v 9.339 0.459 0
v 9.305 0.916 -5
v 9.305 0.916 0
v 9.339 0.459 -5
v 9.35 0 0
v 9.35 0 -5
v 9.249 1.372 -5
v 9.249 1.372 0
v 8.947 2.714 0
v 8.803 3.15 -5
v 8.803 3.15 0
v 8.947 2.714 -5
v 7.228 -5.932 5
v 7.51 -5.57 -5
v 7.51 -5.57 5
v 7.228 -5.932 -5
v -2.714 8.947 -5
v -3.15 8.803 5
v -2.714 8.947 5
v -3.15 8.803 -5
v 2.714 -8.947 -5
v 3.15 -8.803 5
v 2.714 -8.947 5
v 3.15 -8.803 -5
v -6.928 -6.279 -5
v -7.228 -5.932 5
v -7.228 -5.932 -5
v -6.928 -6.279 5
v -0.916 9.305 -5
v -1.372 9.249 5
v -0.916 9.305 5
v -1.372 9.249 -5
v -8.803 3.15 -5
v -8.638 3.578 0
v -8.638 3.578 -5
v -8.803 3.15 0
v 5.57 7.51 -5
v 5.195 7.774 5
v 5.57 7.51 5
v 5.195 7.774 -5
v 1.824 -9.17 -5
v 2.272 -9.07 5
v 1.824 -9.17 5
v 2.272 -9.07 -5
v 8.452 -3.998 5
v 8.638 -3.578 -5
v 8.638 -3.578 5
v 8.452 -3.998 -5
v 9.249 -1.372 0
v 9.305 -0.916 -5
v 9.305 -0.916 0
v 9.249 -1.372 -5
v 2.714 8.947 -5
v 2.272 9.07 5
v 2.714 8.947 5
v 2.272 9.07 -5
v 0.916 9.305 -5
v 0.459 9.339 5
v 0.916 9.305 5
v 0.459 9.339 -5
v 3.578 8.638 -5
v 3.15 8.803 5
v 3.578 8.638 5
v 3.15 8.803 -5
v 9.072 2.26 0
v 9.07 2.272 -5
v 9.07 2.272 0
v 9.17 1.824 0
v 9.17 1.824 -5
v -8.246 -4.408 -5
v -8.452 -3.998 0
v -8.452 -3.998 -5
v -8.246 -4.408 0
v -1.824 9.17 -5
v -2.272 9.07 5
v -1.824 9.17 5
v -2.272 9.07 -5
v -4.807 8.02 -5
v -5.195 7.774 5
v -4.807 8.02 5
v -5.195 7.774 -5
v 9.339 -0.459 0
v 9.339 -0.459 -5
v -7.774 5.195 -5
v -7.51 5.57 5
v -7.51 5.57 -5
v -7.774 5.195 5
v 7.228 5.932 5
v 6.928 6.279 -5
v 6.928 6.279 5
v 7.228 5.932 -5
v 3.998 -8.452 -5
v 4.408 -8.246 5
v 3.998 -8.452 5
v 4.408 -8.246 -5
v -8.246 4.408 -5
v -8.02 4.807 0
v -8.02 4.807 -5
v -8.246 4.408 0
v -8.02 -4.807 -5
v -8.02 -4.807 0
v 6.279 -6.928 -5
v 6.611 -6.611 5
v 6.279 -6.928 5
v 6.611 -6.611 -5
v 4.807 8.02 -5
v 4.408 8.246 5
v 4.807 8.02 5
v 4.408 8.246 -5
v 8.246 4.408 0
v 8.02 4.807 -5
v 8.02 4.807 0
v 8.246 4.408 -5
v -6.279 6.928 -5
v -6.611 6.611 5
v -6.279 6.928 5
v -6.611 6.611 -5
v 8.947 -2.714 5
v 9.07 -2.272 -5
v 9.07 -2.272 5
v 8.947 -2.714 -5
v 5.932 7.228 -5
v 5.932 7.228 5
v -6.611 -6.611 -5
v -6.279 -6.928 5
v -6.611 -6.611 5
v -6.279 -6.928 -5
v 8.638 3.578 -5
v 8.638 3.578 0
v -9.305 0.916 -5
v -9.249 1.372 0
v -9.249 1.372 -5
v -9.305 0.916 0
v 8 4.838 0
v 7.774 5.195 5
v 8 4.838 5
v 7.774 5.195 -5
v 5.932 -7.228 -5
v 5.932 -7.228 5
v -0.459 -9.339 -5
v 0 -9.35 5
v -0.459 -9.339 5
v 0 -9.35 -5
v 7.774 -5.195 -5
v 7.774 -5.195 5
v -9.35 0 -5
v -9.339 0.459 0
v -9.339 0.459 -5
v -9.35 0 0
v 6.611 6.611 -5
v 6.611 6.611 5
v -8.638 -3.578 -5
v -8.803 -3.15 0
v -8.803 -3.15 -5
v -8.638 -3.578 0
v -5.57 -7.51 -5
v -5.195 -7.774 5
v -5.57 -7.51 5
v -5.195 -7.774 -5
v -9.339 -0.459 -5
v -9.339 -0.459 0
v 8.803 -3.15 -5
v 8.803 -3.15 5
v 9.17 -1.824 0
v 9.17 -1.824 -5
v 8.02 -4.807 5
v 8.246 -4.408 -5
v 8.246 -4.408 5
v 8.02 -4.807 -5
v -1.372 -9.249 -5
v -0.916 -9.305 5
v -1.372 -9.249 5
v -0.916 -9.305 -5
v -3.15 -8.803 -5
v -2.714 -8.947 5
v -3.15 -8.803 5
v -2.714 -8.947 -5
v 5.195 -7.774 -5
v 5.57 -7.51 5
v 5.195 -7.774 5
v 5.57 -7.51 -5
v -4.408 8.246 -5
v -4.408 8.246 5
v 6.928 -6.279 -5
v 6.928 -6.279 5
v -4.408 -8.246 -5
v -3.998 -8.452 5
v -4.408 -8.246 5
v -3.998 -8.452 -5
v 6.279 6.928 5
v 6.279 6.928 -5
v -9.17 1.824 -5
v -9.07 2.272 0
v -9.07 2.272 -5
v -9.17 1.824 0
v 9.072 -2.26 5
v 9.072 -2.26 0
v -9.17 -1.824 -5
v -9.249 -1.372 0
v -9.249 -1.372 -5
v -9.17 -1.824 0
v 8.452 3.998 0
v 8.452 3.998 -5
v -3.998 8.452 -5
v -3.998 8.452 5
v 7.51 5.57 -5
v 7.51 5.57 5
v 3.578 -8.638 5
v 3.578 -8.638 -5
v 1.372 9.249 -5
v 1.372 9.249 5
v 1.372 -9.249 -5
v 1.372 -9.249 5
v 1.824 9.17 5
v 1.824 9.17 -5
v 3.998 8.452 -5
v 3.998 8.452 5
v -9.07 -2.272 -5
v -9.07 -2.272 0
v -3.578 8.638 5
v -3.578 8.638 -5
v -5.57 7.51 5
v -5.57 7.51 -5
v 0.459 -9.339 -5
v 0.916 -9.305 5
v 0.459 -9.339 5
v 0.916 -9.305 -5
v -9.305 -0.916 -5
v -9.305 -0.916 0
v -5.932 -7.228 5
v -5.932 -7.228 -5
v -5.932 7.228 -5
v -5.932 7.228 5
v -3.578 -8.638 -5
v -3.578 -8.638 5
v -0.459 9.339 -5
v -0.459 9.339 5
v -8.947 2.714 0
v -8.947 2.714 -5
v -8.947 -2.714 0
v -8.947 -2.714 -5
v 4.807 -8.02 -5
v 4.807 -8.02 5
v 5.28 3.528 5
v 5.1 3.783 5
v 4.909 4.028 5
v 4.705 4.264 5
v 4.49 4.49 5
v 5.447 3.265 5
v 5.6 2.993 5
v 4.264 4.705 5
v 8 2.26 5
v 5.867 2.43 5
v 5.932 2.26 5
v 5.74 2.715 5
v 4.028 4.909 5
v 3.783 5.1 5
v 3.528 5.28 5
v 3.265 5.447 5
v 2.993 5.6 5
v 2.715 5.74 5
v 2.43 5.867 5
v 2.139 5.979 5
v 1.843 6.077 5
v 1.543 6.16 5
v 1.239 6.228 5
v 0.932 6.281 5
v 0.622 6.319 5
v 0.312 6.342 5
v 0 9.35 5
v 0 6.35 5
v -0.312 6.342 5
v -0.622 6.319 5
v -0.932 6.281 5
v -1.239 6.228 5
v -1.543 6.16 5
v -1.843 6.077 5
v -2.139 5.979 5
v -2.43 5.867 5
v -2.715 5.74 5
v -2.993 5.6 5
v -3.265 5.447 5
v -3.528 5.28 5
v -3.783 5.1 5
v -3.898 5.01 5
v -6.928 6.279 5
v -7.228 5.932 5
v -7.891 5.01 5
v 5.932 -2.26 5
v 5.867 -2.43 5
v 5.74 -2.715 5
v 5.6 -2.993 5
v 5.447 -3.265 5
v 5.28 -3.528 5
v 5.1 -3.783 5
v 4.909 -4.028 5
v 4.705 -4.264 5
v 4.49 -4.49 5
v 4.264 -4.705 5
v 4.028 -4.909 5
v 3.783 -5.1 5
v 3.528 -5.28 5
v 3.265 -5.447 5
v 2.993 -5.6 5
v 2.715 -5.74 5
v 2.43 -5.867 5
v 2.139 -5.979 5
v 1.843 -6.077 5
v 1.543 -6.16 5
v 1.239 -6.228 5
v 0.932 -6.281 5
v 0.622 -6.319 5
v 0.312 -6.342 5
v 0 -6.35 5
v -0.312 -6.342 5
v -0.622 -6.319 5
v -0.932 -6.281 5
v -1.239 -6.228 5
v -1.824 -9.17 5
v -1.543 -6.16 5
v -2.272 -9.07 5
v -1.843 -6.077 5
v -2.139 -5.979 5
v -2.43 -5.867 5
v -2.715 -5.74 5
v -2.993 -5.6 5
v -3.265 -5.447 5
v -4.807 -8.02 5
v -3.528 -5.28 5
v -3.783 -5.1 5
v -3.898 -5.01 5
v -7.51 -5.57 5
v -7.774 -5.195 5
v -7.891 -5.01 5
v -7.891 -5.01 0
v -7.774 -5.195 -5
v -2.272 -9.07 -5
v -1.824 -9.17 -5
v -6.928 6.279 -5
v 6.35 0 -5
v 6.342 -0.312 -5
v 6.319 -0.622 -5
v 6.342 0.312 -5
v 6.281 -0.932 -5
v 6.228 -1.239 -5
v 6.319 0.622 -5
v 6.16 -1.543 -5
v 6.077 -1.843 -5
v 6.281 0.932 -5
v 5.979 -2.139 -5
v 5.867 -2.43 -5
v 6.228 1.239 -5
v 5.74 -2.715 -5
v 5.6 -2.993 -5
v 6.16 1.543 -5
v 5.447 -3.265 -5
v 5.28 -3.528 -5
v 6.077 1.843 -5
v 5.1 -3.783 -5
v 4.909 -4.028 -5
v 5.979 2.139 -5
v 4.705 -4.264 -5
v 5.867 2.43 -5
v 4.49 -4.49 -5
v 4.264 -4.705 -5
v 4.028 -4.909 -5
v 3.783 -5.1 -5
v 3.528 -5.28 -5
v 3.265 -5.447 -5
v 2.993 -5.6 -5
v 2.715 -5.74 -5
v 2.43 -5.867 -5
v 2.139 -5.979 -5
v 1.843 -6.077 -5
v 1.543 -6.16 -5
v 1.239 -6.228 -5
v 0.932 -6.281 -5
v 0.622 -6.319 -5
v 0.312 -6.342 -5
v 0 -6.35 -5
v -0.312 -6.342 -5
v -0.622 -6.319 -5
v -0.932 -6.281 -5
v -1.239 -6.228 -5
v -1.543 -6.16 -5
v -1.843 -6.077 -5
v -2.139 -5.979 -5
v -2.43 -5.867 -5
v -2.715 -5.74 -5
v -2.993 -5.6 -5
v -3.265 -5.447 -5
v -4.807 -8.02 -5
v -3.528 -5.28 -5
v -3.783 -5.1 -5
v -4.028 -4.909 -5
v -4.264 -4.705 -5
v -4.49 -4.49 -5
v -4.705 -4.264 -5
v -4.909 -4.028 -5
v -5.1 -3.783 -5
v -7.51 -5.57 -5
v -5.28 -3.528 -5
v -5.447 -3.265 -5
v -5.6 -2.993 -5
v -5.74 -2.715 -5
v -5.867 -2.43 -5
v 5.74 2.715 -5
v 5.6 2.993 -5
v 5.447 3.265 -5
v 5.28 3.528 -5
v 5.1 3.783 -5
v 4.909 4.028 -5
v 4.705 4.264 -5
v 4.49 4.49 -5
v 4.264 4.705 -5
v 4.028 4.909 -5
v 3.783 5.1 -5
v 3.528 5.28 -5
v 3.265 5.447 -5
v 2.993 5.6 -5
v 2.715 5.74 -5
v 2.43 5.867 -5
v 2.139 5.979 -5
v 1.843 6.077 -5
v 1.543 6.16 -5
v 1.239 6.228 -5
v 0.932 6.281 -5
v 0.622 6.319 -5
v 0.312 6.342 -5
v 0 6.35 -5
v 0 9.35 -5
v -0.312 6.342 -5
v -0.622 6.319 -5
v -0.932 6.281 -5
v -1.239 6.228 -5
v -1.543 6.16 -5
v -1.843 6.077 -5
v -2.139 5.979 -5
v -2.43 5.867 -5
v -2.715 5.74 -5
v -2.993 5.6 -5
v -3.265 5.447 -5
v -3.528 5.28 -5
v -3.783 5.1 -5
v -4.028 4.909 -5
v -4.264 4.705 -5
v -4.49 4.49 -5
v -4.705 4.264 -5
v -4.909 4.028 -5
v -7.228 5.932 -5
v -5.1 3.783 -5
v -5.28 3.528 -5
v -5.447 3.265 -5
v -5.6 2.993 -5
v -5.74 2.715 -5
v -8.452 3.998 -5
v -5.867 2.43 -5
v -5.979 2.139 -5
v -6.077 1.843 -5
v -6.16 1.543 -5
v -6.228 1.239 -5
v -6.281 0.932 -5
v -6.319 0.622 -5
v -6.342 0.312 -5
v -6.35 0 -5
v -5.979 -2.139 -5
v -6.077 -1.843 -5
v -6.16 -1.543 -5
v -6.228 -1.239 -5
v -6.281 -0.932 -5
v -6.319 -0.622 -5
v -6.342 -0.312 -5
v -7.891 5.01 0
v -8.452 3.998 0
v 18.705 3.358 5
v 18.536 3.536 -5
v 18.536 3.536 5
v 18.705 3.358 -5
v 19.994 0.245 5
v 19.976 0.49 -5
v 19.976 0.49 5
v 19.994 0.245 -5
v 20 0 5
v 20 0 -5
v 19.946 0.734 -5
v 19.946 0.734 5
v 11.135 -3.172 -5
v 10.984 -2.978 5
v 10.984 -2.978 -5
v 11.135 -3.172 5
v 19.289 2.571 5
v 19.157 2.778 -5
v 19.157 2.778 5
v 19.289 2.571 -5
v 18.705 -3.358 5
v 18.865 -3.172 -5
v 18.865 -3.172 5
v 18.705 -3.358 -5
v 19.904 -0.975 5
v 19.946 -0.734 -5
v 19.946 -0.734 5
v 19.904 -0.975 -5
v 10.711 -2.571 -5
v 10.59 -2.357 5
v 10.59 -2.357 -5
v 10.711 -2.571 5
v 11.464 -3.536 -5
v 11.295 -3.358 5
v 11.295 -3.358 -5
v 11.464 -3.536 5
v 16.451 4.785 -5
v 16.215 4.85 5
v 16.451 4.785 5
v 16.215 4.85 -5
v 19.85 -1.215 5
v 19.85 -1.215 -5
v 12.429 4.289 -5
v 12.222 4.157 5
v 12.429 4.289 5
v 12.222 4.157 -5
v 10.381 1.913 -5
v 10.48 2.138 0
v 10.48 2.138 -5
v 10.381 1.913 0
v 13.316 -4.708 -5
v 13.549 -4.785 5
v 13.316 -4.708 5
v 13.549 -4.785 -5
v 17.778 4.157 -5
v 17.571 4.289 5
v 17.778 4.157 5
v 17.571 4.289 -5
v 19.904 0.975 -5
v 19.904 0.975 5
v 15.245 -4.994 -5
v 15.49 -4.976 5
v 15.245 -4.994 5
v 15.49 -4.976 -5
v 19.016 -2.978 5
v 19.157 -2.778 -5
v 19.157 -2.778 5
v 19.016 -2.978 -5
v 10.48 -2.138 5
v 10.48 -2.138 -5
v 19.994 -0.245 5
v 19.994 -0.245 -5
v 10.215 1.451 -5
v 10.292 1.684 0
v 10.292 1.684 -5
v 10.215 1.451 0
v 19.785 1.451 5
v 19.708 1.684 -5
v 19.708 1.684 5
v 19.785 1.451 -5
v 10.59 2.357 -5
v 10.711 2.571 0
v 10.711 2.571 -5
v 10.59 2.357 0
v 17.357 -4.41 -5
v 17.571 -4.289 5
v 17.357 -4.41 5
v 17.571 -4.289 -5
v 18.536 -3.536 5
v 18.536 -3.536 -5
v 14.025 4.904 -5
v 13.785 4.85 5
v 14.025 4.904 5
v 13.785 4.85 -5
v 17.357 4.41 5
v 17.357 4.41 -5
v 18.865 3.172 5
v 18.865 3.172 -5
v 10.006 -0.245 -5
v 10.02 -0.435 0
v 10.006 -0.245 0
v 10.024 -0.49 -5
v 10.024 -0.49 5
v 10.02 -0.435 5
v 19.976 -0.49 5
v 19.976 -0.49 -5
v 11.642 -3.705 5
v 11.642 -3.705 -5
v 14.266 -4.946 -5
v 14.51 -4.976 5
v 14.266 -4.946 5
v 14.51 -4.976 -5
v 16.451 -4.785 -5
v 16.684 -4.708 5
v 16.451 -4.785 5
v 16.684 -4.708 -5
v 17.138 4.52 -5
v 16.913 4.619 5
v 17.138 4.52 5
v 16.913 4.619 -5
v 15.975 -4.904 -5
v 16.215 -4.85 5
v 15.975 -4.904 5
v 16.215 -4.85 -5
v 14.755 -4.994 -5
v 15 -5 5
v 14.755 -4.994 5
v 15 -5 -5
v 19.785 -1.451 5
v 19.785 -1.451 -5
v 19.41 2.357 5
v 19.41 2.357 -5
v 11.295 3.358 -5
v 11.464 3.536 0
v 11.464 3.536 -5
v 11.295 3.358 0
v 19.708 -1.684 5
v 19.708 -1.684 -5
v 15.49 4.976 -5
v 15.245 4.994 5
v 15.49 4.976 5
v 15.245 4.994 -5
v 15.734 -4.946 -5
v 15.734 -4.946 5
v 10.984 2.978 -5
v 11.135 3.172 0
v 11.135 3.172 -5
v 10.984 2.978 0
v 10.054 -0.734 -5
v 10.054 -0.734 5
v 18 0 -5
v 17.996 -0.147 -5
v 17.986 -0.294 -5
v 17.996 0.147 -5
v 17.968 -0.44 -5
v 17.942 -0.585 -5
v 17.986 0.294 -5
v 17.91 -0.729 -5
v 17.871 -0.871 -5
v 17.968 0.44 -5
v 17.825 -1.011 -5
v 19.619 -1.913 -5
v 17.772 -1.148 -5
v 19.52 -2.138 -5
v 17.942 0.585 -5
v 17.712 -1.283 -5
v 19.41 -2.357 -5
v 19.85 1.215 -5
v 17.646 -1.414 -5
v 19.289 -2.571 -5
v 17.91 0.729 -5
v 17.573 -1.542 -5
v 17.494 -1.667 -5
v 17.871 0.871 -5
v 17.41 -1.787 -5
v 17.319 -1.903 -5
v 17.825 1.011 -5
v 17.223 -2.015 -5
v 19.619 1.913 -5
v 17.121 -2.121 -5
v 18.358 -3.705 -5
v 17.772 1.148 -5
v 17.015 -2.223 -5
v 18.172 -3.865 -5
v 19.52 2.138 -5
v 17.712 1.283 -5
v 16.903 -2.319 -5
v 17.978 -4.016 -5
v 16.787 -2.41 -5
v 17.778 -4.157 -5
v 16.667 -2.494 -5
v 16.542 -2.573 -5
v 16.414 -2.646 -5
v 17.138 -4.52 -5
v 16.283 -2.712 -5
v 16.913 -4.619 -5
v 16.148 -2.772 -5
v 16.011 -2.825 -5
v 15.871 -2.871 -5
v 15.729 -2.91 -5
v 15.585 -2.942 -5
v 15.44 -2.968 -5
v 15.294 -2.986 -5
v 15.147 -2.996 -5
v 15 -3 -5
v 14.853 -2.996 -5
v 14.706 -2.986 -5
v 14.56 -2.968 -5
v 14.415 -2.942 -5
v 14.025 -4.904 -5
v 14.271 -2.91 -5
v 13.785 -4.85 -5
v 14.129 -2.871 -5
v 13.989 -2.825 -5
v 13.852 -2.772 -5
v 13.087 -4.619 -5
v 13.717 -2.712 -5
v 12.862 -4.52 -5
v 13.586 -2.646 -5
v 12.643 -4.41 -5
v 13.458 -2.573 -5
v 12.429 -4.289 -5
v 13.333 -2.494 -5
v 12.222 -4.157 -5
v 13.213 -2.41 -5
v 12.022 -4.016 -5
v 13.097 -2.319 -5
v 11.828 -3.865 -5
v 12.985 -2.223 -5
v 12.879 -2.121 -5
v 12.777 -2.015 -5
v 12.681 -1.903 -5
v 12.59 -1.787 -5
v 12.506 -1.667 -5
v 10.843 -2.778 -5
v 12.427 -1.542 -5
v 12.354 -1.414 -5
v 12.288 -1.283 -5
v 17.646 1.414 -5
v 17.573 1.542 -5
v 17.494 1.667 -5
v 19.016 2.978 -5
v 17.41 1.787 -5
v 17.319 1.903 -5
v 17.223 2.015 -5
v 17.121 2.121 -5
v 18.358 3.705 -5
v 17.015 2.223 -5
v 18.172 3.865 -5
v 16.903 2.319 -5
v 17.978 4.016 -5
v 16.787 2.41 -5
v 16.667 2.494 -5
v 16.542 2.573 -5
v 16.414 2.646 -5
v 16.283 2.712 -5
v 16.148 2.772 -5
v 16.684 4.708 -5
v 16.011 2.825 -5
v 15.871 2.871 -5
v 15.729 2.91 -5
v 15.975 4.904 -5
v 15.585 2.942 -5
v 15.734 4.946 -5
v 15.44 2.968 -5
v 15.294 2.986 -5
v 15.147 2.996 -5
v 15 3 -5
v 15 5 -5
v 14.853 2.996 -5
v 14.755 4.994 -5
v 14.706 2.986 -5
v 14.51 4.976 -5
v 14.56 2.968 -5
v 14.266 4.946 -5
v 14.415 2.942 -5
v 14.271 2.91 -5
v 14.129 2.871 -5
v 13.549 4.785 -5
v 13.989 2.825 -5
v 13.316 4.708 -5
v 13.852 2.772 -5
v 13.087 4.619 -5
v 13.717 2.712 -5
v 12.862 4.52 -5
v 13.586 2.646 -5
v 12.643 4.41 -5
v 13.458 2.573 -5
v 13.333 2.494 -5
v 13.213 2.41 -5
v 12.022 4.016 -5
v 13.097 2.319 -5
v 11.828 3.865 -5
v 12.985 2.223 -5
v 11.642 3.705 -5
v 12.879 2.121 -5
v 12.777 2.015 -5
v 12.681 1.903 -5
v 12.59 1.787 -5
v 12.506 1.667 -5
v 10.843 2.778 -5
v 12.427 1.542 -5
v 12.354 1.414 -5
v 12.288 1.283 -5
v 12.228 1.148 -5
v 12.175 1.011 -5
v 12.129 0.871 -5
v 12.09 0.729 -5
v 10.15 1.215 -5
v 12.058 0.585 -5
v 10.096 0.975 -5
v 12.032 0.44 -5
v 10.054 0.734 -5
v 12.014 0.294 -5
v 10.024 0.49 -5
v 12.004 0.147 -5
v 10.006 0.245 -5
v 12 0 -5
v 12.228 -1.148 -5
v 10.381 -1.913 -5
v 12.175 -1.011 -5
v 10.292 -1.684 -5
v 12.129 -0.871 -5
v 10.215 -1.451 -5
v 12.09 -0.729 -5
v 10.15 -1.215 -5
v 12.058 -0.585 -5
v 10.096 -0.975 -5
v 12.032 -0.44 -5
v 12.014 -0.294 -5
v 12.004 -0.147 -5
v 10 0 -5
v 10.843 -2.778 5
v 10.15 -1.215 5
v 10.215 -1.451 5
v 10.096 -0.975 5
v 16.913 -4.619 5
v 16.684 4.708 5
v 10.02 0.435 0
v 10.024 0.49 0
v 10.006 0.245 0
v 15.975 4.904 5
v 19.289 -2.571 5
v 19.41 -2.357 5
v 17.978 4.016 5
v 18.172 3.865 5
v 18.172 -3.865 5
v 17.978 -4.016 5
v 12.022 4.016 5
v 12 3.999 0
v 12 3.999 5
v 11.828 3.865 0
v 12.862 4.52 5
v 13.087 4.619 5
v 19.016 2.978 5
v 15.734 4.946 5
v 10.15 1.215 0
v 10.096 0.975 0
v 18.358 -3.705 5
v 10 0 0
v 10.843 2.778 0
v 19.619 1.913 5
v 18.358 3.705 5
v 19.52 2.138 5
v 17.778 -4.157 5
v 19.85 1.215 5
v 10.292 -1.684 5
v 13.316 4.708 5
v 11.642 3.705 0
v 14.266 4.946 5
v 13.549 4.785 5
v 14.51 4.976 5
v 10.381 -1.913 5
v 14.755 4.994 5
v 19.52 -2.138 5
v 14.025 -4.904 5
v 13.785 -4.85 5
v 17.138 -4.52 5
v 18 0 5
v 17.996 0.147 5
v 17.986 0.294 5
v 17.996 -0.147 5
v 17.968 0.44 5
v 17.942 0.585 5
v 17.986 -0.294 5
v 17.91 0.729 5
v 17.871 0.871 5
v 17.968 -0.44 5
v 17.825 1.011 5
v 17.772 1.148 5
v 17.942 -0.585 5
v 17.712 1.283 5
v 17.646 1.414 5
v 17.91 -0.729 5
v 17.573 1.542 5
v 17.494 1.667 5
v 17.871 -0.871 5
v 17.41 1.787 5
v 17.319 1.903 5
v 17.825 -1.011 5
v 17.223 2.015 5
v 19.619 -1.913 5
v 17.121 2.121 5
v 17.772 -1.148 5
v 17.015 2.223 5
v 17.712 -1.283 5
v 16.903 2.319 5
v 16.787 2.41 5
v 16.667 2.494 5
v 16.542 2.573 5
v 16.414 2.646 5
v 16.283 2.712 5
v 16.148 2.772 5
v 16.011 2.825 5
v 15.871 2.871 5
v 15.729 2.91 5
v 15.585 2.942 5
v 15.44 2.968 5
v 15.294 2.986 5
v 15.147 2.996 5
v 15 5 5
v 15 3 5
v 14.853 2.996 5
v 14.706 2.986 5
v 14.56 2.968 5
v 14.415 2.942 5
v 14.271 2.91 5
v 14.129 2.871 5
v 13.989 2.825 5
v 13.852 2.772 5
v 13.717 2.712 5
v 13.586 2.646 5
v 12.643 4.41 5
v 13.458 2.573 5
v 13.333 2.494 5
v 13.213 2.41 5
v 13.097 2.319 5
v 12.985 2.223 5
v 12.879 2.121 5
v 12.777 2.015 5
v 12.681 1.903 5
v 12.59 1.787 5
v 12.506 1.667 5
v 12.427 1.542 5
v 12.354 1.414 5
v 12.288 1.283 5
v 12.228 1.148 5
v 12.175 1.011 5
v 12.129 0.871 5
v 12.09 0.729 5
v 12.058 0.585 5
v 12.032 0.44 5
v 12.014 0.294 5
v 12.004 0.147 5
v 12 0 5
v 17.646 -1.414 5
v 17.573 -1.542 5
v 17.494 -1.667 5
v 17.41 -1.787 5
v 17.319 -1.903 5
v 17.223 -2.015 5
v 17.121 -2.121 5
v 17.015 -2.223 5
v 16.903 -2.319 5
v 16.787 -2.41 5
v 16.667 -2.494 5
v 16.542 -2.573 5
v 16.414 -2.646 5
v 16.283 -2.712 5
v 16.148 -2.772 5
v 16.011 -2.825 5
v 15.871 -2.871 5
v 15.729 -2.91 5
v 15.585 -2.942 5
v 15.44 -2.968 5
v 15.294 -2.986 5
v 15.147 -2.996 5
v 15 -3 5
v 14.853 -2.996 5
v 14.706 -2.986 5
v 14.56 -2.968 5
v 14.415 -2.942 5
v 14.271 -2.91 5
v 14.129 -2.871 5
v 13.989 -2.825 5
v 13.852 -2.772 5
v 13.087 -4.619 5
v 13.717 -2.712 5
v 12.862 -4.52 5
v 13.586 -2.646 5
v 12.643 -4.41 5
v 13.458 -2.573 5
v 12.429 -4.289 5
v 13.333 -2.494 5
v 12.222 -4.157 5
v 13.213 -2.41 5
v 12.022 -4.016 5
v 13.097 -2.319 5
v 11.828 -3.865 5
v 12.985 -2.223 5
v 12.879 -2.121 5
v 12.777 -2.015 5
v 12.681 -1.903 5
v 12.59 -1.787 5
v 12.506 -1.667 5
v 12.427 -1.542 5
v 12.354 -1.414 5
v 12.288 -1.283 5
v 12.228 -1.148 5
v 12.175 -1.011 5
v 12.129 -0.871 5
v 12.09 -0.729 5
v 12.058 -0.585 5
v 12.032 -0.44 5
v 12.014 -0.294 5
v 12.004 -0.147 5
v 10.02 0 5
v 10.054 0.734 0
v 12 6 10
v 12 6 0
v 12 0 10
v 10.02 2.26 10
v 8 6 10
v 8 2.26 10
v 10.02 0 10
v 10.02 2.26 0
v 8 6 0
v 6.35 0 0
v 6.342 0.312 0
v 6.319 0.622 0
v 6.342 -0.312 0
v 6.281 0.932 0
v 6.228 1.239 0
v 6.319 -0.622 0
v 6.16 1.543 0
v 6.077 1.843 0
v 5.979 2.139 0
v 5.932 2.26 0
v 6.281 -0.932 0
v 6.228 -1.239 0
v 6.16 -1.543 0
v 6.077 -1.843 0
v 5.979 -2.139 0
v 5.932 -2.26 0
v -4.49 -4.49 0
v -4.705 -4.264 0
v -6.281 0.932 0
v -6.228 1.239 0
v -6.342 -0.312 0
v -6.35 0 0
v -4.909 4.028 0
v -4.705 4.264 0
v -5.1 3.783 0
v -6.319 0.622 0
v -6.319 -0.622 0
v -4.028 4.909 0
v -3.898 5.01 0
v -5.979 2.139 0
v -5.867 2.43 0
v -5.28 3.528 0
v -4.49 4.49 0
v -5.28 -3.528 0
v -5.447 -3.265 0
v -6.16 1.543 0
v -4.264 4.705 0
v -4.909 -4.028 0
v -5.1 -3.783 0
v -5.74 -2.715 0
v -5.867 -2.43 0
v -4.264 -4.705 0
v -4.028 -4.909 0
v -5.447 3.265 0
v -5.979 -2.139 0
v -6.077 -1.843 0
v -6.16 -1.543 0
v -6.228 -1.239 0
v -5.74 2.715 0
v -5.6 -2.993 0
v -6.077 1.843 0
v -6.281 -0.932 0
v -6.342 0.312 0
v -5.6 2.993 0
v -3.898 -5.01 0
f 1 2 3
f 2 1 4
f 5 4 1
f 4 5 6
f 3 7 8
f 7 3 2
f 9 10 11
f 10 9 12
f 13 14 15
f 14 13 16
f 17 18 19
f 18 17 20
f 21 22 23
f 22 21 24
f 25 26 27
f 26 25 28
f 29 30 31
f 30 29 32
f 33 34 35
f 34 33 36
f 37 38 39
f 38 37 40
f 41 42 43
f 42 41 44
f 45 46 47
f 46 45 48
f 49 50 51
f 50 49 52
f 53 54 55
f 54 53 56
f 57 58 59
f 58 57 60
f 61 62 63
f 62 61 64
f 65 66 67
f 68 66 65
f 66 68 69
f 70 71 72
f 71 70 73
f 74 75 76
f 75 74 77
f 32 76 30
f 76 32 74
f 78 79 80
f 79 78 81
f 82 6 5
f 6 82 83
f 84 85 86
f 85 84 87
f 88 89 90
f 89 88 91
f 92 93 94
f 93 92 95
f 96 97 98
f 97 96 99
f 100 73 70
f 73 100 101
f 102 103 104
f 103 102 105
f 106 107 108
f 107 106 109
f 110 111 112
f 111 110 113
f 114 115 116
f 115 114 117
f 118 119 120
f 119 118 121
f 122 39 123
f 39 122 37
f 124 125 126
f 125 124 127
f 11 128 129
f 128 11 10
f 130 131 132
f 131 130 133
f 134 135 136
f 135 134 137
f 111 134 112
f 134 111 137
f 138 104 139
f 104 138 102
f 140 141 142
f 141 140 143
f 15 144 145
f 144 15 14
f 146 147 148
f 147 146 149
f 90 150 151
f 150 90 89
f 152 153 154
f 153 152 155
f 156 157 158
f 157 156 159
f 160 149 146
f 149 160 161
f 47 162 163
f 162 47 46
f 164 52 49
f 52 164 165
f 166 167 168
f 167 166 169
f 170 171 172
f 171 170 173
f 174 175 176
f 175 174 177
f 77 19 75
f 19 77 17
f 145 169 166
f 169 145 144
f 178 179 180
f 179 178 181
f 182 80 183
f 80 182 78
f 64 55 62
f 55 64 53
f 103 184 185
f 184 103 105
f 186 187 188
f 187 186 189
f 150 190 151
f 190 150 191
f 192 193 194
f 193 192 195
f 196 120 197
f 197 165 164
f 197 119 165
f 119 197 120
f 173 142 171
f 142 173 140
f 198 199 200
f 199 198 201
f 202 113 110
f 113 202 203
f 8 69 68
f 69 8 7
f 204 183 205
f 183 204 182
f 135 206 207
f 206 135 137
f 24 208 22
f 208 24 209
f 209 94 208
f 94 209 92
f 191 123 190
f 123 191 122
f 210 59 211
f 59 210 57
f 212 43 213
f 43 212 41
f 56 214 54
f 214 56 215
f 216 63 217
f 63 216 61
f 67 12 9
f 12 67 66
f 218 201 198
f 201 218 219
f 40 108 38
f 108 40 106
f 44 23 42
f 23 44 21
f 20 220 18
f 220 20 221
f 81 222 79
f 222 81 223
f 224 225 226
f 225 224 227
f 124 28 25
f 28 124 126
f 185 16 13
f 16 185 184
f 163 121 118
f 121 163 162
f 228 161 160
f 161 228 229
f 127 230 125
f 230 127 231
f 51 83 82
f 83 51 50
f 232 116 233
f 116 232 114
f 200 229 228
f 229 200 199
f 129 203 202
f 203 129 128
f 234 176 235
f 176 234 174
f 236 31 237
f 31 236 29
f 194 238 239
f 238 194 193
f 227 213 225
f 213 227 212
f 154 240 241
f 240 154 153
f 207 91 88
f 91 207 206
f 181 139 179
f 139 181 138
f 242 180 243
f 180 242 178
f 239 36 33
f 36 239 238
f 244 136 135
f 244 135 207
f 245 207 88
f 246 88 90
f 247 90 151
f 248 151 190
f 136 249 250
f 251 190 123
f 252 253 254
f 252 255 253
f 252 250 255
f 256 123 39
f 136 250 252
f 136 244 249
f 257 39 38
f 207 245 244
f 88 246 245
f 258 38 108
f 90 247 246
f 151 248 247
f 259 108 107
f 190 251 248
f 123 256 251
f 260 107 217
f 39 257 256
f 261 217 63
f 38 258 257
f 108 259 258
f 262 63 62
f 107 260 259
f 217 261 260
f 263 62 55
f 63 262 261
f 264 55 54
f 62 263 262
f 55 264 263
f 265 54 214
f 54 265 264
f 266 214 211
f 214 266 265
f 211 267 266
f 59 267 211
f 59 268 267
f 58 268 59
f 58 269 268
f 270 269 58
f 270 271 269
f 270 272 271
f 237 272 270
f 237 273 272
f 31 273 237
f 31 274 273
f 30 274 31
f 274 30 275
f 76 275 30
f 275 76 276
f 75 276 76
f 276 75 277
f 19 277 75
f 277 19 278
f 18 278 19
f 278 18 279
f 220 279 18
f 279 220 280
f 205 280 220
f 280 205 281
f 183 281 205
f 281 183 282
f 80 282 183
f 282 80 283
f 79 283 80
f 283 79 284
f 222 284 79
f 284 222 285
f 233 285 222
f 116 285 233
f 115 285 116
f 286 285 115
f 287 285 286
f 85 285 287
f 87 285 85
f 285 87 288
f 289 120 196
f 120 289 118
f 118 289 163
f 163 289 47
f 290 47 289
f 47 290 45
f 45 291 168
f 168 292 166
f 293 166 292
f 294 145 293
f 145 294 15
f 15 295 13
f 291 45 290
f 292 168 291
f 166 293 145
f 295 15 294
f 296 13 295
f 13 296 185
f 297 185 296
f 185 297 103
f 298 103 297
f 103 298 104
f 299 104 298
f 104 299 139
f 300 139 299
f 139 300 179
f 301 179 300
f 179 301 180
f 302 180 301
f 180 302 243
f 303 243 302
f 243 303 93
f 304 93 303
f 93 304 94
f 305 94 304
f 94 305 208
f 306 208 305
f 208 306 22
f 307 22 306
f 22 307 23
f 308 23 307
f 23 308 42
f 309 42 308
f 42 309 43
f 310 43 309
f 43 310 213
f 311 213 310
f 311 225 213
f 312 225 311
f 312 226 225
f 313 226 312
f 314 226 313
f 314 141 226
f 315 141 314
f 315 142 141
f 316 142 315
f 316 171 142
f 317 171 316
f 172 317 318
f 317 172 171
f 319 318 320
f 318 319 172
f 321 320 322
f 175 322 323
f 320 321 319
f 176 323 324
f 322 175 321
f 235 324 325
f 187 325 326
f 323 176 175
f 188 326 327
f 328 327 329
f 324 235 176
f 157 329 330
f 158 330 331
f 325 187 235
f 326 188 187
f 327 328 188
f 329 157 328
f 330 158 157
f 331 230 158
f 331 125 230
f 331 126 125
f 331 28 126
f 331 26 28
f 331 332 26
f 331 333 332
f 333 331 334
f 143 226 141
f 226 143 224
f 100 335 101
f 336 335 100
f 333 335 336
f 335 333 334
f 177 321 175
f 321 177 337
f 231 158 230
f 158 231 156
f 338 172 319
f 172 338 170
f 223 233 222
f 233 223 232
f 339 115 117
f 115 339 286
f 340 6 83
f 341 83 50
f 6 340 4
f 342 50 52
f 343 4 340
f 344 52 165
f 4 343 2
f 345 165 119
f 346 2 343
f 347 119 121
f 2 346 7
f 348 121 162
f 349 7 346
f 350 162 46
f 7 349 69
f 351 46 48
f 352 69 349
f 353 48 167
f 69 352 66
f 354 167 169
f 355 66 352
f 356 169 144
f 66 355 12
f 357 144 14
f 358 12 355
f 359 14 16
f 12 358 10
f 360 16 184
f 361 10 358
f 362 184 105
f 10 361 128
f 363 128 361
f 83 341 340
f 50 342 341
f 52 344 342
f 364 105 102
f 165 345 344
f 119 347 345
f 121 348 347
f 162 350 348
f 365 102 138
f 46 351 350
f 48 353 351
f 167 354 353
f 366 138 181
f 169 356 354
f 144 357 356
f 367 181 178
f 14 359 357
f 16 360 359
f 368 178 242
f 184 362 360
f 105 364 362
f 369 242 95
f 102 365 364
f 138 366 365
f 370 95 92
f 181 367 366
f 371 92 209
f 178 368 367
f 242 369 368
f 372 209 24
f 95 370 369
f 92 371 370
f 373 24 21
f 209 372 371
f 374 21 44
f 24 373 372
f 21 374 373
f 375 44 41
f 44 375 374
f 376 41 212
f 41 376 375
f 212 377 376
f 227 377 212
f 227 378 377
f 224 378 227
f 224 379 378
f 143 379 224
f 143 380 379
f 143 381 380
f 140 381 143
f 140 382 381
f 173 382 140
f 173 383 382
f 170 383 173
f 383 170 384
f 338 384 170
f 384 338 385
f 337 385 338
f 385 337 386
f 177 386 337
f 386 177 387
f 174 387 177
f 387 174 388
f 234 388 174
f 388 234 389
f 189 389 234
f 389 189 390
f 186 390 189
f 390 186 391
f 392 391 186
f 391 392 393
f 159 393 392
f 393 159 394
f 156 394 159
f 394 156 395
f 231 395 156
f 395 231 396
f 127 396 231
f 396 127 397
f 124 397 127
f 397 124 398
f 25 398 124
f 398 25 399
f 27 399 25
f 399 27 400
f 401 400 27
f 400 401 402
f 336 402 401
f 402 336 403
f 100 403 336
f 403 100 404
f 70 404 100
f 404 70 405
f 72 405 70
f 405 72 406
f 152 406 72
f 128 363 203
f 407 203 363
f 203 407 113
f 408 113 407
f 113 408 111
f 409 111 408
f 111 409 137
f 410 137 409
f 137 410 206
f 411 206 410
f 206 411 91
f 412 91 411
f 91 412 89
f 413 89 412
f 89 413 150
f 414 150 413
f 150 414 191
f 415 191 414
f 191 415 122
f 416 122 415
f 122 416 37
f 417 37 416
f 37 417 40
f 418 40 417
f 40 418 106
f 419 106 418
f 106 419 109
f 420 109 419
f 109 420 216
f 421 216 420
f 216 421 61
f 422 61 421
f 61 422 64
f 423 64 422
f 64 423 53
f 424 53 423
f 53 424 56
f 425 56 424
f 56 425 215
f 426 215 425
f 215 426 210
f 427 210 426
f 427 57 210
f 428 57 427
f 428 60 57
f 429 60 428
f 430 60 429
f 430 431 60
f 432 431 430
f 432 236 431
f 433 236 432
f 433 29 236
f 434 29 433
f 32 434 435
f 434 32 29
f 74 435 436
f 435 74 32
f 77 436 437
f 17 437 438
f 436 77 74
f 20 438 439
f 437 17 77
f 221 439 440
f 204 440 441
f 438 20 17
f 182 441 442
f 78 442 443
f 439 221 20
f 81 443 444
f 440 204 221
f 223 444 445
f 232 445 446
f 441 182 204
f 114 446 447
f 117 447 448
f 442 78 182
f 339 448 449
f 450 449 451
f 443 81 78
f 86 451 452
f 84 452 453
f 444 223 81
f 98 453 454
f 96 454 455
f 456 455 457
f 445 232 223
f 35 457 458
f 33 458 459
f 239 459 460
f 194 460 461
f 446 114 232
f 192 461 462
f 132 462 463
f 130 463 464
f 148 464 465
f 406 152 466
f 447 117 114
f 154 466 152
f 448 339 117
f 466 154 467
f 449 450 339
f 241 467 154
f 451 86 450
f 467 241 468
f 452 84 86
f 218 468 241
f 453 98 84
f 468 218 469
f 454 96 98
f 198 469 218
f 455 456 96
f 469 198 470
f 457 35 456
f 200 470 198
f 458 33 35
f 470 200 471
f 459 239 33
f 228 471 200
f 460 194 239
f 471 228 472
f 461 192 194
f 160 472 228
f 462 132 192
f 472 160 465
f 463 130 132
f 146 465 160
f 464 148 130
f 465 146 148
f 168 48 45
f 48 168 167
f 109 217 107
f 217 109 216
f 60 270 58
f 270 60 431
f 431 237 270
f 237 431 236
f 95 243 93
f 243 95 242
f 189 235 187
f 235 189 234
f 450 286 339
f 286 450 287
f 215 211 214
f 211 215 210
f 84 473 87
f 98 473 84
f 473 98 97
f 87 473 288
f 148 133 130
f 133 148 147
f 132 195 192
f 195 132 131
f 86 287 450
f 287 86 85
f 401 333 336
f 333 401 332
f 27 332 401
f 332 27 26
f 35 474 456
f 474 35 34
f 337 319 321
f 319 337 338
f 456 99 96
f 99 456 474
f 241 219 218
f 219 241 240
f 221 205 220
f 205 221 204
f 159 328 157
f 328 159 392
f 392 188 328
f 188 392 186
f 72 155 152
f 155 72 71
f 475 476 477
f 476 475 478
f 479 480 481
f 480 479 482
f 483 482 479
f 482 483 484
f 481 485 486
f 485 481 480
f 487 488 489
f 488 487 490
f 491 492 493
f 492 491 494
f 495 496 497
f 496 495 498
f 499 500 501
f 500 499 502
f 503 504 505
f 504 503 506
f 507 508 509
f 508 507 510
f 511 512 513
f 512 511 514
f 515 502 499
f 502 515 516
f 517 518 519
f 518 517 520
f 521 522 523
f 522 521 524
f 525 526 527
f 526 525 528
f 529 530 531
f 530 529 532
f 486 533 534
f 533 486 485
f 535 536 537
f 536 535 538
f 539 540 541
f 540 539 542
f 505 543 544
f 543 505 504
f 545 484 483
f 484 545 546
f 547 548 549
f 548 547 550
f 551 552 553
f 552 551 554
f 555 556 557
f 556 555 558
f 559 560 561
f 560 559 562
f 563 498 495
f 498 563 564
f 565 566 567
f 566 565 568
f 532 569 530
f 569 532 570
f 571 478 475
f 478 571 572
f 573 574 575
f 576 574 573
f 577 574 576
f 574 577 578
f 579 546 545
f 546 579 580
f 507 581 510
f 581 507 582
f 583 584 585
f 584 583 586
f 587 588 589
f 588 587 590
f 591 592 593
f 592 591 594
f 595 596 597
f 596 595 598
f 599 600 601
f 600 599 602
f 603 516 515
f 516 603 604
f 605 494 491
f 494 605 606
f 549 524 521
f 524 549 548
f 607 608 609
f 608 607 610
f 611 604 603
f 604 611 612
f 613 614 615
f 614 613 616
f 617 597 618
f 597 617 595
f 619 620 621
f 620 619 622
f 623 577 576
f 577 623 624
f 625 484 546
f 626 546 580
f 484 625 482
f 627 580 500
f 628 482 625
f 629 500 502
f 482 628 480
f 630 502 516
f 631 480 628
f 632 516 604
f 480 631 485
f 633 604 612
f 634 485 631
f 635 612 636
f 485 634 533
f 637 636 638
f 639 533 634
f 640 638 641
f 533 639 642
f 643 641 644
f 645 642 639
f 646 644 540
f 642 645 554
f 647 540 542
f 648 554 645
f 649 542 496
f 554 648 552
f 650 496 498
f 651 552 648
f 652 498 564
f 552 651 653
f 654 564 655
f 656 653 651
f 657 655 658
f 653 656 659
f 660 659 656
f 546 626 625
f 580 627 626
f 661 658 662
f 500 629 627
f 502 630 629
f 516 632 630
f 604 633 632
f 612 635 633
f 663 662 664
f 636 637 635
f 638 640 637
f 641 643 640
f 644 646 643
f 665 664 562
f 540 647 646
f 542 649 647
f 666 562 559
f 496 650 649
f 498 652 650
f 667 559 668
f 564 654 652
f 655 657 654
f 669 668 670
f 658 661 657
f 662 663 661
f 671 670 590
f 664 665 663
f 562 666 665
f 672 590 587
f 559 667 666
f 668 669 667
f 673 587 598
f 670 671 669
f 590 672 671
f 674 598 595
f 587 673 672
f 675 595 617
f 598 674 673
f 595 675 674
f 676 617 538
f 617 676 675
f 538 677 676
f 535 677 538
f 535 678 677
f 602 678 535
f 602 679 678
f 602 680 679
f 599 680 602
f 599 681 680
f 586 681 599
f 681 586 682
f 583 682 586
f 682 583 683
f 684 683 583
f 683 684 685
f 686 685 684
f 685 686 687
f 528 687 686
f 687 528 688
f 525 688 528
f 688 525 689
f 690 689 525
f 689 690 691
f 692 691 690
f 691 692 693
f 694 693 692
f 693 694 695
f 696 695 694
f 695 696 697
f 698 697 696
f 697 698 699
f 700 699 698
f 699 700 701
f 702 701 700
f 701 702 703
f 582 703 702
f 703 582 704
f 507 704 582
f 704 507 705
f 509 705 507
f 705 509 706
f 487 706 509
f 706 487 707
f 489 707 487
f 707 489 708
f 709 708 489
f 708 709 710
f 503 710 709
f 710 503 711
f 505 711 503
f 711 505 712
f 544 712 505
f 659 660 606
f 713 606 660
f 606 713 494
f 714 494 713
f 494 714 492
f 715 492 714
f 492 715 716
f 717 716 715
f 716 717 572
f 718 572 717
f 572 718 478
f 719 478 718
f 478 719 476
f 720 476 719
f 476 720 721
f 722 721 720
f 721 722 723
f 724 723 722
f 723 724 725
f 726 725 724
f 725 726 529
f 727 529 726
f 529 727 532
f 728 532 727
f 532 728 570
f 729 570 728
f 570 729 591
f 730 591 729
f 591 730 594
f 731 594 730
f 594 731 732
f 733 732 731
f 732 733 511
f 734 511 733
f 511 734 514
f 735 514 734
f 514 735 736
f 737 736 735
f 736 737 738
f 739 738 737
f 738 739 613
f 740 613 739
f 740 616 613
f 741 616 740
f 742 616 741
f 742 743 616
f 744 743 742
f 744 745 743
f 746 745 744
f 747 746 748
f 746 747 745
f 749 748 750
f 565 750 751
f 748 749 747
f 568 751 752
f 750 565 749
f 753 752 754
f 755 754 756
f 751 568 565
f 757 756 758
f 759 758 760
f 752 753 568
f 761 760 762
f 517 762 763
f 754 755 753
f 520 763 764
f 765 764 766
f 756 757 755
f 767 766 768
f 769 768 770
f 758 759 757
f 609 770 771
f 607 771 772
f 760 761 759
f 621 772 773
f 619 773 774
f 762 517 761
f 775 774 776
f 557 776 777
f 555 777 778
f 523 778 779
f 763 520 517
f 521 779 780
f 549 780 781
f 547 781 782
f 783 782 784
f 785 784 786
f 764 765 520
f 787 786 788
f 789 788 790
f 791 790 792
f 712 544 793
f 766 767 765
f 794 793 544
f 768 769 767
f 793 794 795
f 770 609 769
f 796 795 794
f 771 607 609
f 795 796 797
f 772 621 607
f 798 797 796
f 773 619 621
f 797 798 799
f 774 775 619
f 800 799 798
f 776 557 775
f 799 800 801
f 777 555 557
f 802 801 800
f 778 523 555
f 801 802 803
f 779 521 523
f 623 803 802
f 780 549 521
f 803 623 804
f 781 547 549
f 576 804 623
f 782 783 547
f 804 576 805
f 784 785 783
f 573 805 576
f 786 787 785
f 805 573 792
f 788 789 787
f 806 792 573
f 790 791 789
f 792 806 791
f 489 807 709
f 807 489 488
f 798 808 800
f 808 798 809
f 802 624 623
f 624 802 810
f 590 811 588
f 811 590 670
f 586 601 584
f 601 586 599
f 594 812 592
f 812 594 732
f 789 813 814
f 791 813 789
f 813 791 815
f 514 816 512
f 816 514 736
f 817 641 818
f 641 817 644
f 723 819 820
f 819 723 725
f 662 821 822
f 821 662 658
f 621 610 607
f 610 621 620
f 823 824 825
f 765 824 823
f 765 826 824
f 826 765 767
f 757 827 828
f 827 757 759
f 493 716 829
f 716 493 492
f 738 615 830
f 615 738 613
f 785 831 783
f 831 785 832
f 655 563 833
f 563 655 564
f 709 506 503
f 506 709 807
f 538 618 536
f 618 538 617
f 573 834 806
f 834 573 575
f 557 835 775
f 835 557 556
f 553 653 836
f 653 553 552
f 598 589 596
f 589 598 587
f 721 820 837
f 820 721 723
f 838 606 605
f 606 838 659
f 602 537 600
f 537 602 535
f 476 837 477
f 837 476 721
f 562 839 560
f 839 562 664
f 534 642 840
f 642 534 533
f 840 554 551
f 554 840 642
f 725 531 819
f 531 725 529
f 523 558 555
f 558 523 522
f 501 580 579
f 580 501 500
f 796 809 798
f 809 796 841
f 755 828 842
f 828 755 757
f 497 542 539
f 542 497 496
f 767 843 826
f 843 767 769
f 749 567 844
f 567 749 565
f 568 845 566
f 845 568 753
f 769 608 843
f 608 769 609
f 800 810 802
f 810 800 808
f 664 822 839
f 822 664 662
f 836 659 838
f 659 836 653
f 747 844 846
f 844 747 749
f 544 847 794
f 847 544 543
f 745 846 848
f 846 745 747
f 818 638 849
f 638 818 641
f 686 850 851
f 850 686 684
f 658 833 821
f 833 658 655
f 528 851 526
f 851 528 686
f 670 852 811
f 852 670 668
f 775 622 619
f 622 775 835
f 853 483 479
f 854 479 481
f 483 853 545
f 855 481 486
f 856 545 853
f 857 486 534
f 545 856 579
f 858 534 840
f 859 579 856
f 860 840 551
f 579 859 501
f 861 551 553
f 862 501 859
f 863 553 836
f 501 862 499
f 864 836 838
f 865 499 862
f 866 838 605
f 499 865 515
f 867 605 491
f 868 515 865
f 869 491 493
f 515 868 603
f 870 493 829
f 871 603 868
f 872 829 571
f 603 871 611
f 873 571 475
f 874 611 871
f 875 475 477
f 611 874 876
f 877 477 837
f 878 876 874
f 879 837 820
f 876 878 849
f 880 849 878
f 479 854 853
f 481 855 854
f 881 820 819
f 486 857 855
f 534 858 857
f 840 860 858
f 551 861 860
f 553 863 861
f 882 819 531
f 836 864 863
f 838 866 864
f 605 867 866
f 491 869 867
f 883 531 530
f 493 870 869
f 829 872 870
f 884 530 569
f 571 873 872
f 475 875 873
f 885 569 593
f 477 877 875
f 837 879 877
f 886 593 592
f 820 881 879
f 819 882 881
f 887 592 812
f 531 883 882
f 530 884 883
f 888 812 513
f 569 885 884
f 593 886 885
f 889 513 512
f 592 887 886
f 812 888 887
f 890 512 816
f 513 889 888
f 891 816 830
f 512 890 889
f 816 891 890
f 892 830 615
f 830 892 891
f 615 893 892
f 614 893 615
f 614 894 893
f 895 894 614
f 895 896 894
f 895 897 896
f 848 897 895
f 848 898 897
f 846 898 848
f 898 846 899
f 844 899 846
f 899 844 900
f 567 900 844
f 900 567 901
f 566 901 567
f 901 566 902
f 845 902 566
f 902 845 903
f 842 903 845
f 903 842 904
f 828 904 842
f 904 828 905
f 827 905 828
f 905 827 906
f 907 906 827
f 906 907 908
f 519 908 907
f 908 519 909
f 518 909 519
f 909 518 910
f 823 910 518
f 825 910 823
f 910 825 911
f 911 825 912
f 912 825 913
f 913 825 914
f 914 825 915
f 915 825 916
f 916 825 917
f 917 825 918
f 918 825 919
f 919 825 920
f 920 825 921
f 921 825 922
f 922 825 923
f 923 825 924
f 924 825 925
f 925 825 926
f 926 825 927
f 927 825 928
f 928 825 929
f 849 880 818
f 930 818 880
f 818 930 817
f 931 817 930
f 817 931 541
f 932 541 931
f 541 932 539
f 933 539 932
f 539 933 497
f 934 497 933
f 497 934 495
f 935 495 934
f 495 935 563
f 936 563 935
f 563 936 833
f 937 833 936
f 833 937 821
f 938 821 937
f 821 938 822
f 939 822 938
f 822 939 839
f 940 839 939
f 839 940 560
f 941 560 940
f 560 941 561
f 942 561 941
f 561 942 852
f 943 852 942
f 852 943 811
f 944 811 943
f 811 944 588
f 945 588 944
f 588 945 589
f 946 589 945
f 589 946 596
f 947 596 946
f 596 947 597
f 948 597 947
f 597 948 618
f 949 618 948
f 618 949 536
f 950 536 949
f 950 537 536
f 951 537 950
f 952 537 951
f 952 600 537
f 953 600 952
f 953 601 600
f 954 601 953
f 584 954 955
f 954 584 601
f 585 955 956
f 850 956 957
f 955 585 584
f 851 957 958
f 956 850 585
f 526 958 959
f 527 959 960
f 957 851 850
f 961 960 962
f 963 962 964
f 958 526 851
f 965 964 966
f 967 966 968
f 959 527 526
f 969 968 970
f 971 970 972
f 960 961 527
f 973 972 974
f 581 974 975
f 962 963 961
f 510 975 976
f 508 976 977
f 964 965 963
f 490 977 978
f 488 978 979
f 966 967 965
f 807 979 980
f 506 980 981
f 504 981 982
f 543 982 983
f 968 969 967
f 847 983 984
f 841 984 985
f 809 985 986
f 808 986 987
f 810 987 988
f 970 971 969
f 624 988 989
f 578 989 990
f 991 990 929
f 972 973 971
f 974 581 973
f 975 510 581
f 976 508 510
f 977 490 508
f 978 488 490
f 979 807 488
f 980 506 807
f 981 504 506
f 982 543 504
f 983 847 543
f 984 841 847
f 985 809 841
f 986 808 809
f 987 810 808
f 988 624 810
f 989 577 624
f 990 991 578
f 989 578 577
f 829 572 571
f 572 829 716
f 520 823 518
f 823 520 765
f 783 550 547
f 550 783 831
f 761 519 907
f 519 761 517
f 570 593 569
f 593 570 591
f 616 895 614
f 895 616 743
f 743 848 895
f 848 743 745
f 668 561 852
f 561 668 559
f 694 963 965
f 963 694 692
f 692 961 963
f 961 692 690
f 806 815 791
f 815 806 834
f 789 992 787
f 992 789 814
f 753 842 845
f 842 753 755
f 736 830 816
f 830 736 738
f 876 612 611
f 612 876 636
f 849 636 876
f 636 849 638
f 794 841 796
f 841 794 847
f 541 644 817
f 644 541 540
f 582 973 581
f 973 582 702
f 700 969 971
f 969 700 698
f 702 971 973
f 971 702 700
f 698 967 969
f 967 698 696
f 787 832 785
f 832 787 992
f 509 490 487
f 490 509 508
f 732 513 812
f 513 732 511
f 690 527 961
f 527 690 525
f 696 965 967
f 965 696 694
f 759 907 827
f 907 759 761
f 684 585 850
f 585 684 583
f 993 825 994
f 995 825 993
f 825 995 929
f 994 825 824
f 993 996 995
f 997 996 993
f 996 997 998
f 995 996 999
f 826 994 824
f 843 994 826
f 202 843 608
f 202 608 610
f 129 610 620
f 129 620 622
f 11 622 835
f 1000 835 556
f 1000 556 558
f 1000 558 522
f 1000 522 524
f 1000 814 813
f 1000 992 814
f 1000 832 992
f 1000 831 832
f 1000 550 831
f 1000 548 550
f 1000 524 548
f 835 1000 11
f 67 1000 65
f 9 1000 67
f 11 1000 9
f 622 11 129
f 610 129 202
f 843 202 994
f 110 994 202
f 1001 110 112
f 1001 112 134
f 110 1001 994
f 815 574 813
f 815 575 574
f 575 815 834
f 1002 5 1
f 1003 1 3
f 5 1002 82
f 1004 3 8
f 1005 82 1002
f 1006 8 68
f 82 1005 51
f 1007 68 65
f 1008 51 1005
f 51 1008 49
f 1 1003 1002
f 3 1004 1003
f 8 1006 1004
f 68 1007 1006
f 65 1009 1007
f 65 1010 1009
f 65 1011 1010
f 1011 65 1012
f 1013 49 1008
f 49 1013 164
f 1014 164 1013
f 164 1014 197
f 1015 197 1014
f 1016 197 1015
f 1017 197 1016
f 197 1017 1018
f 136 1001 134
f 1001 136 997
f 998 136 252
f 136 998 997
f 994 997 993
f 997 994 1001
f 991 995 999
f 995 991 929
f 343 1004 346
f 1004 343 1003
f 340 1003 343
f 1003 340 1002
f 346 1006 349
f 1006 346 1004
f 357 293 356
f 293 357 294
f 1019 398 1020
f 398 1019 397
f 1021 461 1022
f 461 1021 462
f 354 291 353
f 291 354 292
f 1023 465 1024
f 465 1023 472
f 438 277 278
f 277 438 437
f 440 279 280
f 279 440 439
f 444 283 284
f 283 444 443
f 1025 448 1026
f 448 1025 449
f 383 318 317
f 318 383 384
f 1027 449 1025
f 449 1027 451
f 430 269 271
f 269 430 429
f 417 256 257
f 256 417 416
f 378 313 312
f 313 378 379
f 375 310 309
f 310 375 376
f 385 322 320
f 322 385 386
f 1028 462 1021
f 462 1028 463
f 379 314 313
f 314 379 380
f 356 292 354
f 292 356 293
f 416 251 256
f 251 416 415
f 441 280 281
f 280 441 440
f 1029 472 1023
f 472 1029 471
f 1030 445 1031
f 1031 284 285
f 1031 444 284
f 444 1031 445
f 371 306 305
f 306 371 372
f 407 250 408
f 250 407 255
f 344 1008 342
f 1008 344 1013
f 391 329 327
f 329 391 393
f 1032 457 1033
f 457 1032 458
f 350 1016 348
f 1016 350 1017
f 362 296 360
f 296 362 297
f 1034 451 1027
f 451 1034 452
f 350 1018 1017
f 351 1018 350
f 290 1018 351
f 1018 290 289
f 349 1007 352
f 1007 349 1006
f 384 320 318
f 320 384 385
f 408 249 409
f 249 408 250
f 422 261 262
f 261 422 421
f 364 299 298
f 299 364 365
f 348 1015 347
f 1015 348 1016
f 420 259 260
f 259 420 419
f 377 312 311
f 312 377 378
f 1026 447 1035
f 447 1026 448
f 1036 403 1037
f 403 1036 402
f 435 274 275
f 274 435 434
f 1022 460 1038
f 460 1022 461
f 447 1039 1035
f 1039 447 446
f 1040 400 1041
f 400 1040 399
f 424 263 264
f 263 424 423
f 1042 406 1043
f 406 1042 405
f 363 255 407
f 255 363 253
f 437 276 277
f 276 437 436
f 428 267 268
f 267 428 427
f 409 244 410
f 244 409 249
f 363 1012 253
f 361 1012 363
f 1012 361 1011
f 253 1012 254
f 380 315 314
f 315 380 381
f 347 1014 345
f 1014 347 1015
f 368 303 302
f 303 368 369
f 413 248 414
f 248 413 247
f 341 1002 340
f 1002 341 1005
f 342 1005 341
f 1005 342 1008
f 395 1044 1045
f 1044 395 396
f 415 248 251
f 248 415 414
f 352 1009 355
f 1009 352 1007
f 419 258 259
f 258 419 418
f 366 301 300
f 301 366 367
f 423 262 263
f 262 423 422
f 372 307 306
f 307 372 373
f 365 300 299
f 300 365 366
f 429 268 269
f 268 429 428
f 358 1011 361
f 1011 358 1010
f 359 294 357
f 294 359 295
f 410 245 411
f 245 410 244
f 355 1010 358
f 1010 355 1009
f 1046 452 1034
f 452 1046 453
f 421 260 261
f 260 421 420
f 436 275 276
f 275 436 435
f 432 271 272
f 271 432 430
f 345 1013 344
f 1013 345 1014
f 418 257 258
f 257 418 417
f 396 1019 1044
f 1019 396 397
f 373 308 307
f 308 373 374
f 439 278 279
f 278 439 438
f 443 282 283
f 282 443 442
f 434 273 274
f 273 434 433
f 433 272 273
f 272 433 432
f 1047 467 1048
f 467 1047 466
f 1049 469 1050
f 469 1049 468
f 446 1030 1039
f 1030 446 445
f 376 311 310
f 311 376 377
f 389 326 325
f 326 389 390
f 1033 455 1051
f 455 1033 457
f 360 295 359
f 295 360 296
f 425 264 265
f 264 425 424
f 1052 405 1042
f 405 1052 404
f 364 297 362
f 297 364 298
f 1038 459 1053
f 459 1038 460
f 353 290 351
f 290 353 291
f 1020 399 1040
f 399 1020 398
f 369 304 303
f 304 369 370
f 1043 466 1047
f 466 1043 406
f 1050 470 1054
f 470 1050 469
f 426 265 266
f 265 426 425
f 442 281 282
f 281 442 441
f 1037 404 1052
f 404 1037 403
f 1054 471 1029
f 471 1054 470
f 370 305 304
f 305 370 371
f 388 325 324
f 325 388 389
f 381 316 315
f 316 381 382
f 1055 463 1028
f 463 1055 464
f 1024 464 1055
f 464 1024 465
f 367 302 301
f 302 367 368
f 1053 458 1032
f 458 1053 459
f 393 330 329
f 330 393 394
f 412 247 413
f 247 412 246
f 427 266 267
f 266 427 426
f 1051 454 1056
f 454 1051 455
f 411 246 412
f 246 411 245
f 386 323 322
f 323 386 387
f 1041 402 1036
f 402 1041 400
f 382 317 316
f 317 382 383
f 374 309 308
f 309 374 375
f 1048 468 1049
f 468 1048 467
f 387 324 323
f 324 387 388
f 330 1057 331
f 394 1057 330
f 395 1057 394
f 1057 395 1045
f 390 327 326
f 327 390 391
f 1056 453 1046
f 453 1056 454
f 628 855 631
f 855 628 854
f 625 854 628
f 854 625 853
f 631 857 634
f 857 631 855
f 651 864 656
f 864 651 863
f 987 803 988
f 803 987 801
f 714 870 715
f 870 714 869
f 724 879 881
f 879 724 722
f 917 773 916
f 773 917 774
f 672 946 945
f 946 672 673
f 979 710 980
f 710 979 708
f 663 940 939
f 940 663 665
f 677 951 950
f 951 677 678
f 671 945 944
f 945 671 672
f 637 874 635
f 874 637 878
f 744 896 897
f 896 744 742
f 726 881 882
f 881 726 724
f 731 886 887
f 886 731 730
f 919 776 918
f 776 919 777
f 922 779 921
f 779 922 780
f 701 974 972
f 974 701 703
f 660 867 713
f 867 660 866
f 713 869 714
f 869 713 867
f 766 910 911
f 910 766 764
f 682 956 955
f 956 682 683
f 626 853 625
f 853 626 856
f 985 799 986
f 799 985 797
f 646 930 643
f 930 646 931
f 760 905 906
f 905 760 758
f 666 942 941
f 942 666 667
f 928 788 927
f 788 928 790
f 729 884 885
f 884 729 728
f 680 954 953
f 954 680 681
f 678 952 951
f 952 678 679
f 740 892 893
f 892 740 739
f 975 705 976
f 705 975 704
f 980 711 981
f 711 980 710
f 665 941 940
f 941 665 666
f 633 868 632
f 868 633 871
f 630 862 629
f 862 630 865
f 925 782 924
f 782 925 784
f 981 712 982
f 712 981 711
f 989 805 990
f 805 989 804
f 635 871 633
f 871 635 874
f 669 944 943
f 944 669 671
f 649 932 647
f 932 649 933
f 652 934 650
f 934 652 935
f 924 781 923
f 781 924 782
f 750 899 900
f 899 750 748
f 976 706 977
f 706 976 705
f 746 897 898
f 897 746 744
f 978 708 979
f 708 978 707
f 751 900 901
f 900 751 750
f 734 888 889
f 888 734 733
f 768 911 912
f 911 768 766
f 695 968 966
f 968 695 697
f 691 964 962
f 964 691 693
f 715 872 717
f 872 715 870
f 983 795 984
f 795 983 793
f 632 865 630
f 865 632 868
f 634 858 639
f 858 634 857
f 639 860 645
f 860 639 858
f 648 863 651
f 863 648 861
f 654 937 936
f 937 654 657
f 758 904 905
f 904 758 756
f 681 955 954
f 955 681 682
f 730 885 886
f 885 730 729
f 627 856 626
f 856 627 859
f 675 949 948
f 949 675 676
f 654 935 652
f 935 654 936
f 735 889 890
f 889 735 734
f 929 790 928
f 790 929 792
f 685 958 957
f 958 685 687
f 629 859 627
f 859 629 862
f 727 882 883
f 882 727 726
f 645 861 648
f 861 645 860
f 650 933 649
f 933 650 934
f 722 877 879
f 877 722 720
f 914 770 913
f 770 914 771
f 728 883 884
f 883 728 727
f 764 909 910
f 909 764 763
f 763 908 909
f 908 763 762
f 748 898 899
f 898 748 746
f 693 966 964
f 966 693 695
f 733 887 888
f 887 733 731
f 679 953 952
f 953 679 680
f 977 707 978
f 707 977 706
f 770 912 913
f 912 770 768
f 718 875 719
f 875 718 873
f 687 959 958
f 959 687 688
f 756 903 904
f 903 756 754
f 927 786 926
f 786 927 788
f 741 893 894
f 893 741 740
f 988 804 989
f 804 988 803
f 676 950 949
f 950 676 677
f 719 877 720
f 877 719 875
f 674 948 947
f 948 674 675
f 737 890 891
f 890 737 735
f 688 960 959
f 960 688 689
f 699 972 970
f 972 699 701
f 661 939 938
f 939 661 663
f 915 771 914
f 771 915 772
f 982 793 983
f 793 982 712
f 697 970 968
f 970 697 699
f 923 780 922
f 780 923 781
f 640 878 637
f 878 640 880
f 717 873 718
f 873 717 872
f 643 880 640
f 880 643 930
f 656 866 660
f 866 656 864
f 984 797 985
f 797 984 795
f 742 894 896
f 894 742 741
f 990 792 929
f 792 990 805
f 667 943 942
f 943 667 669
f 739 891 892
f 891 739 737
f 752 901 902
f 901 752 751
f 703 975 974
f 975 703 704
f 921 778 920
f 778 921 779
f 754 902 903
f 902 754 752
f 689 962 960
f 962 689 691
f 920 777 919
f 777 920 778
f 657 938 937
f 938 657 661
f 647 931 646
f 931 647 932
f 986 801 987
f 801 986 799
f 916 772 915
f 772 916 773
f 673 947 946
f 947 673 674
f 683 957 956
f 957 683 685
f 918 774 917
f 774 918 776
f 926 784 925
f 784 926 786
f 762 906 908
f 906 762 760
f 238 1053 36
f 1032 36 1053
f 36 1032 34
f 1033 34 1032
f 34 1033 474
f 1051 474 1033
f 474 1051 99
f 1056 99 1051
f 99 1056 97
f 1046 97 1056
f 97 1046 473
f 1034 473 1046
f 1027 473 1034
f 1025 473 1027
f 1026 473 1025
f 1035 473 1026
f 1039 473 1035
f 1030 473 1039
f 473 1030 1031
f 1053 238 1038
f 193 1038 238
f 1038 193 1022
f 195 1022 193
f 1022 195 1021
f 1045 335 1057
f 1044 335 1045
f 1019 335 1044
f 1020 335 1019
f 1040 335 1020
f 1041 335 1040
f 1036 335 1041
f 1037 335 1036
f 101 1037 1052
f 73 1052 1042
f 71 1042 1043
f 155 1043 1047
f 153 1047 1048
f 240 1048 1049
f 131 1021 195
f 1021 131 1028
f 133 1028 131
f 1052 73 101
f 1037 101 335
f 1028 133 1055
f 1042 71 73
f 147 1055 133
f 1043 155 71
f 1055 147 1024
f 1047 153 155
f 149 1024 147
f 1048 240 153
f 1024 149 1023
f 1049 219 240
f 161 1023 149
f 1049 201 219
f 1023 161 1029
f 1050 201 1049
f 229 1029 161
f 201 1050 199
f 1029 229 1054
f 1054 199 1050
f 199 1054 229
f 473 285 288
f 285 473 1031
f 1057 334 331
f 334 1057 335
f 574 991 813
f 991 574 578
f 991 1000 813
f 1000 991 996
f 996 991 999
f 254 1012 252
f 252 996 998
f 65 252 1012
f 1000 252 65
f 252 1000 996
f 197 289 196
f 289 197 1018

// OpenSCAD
// Snap-on Clip for Lab Stand Rod and Tubing (Corrected)
// Orientation: Flat on XY plane, building upward (+Z)
// Units: Millimetres

// --- Dimensions ---
// Rod Stand Dimensions
$rod_diameter = 12.7;
$rod_wall_thickness = 3;
$rod_outer_diameter = $rod_diameter + 2 * $rod_wall_thickness; // 18.7
$rod_ring_height = 10;

// Tubing Dimensions
$tubing_diameter = 6;
$tubing_wall_thickness = 2;
$tubing_outer_diameter = $tubing_diameter + 2 * $tubing_wall_thickness; // 8
$tubing_ring_height = 10;

// Positioning
$rod_center_x = 0;
$rod_center_y = 0;
$tubing_center_x = 15;
$tubing_center_y = 0;

// Bridge Dimensions
$bridge_width_x = 4; // From x=8 to x=12
$bridge_width_y = 6;
$bridge_height = 10;
$bridge_start_x = 8;
$bridge_end_x = 12;

// Cutout Dimensions
// Rod cutout: 10mm wide, centered at y=0, on -X side
$rod_cutout_width = 10;
$rod_cutout_half_y = $rod_cutout_width / 2; // 5

// Tubing cutout: 4.5mm wide, centered at y=0, on +X side
$tubing_cutout_width = 4.5;
$tubing_cutout_half_y = $tubing_cutout_width / 2; // 2.25

// --- Configuration ---
$fn = 128; // High resolution for smooth curves and accurate hole sizes

// --- Main Body Construction ---
difference() {
    // 1. Create the solid base profile (Outer Rings + Bridge)
    union() {
        // Rod Outer Ring
        translate([0, 0, 0]) {
            cylinder(h = $rod_ring_height, d = $rod_outer_diameter, center = true);
        }
        
        // Tubing Outer Ring
        translate([$tubing_center_x, $tubing_center_y, 0]) {
            cylinder(h = $tubing_ring_height, d = $tubing_outer_diameter, center = true);
        }
        
        // Solid Bridge
        translate([$bridge_start_x, 0, 0]) {
            cube([$bridge_width_x, $bridge_width_y, $bridge_height]);
        }
    }
    
    // 2. Cut out the Rod Hole (Inner Cylinder)
    // Extend slightly past the top and bottom faces to ensure clean cut
    translate([0, 0, -0.01]) 
        cylinder(h = $rod_ring_height + 0.02, d = $rod_diameter, center = true);
    
    // 3. Cut out the Tubing Hole (Inner Cylinder)
    // Extend slightly past the top and bottom faces to ensure clean cut
    translate([$tubing_center_x, $tubing_center_y, -0.01]) 
        cylinder(h = $tubing_ring_height + 0.02, d = $tubing_diameter, center = true);
    
    // 4. Cut out Rod Rectangular Opening (-X side)
    // Position: Centered at y=0, extending from x = -($rod_outer_diameter/2) to x = -($rod_outer_diameter/2) + $rod_cutout_width
    // We subtract a prism that extends slightly past the ring face to ensure the cut goes all the way through
    translate([-($rod_outer_diameter/2) - 0.5, -($rod_cutout_half_y) - 0.01, 0]) 
        cube([$rod_cutout_width + 0.02, $rod_cutout_width + 0.02, $rod_ring_height + 0.01]);
    
    // 5. Cut out Tubing Rectangular Opening (+X side)
    // Position: Centered at y=0, extending from x = $tubing_outer_diameter/2 to x = $tubing_outer_diameter/2 + $tubing_cutout_width
    translate([$tubing_outer_diameter/2 + 0.5, -($tubing_cutout_half_y) - 0.01, 0]) 
        cube([$tubing_cutout_width + 0.02, $tubing_cutout_width + 0.02, $tubing_ring_height + 0.01]);
}
